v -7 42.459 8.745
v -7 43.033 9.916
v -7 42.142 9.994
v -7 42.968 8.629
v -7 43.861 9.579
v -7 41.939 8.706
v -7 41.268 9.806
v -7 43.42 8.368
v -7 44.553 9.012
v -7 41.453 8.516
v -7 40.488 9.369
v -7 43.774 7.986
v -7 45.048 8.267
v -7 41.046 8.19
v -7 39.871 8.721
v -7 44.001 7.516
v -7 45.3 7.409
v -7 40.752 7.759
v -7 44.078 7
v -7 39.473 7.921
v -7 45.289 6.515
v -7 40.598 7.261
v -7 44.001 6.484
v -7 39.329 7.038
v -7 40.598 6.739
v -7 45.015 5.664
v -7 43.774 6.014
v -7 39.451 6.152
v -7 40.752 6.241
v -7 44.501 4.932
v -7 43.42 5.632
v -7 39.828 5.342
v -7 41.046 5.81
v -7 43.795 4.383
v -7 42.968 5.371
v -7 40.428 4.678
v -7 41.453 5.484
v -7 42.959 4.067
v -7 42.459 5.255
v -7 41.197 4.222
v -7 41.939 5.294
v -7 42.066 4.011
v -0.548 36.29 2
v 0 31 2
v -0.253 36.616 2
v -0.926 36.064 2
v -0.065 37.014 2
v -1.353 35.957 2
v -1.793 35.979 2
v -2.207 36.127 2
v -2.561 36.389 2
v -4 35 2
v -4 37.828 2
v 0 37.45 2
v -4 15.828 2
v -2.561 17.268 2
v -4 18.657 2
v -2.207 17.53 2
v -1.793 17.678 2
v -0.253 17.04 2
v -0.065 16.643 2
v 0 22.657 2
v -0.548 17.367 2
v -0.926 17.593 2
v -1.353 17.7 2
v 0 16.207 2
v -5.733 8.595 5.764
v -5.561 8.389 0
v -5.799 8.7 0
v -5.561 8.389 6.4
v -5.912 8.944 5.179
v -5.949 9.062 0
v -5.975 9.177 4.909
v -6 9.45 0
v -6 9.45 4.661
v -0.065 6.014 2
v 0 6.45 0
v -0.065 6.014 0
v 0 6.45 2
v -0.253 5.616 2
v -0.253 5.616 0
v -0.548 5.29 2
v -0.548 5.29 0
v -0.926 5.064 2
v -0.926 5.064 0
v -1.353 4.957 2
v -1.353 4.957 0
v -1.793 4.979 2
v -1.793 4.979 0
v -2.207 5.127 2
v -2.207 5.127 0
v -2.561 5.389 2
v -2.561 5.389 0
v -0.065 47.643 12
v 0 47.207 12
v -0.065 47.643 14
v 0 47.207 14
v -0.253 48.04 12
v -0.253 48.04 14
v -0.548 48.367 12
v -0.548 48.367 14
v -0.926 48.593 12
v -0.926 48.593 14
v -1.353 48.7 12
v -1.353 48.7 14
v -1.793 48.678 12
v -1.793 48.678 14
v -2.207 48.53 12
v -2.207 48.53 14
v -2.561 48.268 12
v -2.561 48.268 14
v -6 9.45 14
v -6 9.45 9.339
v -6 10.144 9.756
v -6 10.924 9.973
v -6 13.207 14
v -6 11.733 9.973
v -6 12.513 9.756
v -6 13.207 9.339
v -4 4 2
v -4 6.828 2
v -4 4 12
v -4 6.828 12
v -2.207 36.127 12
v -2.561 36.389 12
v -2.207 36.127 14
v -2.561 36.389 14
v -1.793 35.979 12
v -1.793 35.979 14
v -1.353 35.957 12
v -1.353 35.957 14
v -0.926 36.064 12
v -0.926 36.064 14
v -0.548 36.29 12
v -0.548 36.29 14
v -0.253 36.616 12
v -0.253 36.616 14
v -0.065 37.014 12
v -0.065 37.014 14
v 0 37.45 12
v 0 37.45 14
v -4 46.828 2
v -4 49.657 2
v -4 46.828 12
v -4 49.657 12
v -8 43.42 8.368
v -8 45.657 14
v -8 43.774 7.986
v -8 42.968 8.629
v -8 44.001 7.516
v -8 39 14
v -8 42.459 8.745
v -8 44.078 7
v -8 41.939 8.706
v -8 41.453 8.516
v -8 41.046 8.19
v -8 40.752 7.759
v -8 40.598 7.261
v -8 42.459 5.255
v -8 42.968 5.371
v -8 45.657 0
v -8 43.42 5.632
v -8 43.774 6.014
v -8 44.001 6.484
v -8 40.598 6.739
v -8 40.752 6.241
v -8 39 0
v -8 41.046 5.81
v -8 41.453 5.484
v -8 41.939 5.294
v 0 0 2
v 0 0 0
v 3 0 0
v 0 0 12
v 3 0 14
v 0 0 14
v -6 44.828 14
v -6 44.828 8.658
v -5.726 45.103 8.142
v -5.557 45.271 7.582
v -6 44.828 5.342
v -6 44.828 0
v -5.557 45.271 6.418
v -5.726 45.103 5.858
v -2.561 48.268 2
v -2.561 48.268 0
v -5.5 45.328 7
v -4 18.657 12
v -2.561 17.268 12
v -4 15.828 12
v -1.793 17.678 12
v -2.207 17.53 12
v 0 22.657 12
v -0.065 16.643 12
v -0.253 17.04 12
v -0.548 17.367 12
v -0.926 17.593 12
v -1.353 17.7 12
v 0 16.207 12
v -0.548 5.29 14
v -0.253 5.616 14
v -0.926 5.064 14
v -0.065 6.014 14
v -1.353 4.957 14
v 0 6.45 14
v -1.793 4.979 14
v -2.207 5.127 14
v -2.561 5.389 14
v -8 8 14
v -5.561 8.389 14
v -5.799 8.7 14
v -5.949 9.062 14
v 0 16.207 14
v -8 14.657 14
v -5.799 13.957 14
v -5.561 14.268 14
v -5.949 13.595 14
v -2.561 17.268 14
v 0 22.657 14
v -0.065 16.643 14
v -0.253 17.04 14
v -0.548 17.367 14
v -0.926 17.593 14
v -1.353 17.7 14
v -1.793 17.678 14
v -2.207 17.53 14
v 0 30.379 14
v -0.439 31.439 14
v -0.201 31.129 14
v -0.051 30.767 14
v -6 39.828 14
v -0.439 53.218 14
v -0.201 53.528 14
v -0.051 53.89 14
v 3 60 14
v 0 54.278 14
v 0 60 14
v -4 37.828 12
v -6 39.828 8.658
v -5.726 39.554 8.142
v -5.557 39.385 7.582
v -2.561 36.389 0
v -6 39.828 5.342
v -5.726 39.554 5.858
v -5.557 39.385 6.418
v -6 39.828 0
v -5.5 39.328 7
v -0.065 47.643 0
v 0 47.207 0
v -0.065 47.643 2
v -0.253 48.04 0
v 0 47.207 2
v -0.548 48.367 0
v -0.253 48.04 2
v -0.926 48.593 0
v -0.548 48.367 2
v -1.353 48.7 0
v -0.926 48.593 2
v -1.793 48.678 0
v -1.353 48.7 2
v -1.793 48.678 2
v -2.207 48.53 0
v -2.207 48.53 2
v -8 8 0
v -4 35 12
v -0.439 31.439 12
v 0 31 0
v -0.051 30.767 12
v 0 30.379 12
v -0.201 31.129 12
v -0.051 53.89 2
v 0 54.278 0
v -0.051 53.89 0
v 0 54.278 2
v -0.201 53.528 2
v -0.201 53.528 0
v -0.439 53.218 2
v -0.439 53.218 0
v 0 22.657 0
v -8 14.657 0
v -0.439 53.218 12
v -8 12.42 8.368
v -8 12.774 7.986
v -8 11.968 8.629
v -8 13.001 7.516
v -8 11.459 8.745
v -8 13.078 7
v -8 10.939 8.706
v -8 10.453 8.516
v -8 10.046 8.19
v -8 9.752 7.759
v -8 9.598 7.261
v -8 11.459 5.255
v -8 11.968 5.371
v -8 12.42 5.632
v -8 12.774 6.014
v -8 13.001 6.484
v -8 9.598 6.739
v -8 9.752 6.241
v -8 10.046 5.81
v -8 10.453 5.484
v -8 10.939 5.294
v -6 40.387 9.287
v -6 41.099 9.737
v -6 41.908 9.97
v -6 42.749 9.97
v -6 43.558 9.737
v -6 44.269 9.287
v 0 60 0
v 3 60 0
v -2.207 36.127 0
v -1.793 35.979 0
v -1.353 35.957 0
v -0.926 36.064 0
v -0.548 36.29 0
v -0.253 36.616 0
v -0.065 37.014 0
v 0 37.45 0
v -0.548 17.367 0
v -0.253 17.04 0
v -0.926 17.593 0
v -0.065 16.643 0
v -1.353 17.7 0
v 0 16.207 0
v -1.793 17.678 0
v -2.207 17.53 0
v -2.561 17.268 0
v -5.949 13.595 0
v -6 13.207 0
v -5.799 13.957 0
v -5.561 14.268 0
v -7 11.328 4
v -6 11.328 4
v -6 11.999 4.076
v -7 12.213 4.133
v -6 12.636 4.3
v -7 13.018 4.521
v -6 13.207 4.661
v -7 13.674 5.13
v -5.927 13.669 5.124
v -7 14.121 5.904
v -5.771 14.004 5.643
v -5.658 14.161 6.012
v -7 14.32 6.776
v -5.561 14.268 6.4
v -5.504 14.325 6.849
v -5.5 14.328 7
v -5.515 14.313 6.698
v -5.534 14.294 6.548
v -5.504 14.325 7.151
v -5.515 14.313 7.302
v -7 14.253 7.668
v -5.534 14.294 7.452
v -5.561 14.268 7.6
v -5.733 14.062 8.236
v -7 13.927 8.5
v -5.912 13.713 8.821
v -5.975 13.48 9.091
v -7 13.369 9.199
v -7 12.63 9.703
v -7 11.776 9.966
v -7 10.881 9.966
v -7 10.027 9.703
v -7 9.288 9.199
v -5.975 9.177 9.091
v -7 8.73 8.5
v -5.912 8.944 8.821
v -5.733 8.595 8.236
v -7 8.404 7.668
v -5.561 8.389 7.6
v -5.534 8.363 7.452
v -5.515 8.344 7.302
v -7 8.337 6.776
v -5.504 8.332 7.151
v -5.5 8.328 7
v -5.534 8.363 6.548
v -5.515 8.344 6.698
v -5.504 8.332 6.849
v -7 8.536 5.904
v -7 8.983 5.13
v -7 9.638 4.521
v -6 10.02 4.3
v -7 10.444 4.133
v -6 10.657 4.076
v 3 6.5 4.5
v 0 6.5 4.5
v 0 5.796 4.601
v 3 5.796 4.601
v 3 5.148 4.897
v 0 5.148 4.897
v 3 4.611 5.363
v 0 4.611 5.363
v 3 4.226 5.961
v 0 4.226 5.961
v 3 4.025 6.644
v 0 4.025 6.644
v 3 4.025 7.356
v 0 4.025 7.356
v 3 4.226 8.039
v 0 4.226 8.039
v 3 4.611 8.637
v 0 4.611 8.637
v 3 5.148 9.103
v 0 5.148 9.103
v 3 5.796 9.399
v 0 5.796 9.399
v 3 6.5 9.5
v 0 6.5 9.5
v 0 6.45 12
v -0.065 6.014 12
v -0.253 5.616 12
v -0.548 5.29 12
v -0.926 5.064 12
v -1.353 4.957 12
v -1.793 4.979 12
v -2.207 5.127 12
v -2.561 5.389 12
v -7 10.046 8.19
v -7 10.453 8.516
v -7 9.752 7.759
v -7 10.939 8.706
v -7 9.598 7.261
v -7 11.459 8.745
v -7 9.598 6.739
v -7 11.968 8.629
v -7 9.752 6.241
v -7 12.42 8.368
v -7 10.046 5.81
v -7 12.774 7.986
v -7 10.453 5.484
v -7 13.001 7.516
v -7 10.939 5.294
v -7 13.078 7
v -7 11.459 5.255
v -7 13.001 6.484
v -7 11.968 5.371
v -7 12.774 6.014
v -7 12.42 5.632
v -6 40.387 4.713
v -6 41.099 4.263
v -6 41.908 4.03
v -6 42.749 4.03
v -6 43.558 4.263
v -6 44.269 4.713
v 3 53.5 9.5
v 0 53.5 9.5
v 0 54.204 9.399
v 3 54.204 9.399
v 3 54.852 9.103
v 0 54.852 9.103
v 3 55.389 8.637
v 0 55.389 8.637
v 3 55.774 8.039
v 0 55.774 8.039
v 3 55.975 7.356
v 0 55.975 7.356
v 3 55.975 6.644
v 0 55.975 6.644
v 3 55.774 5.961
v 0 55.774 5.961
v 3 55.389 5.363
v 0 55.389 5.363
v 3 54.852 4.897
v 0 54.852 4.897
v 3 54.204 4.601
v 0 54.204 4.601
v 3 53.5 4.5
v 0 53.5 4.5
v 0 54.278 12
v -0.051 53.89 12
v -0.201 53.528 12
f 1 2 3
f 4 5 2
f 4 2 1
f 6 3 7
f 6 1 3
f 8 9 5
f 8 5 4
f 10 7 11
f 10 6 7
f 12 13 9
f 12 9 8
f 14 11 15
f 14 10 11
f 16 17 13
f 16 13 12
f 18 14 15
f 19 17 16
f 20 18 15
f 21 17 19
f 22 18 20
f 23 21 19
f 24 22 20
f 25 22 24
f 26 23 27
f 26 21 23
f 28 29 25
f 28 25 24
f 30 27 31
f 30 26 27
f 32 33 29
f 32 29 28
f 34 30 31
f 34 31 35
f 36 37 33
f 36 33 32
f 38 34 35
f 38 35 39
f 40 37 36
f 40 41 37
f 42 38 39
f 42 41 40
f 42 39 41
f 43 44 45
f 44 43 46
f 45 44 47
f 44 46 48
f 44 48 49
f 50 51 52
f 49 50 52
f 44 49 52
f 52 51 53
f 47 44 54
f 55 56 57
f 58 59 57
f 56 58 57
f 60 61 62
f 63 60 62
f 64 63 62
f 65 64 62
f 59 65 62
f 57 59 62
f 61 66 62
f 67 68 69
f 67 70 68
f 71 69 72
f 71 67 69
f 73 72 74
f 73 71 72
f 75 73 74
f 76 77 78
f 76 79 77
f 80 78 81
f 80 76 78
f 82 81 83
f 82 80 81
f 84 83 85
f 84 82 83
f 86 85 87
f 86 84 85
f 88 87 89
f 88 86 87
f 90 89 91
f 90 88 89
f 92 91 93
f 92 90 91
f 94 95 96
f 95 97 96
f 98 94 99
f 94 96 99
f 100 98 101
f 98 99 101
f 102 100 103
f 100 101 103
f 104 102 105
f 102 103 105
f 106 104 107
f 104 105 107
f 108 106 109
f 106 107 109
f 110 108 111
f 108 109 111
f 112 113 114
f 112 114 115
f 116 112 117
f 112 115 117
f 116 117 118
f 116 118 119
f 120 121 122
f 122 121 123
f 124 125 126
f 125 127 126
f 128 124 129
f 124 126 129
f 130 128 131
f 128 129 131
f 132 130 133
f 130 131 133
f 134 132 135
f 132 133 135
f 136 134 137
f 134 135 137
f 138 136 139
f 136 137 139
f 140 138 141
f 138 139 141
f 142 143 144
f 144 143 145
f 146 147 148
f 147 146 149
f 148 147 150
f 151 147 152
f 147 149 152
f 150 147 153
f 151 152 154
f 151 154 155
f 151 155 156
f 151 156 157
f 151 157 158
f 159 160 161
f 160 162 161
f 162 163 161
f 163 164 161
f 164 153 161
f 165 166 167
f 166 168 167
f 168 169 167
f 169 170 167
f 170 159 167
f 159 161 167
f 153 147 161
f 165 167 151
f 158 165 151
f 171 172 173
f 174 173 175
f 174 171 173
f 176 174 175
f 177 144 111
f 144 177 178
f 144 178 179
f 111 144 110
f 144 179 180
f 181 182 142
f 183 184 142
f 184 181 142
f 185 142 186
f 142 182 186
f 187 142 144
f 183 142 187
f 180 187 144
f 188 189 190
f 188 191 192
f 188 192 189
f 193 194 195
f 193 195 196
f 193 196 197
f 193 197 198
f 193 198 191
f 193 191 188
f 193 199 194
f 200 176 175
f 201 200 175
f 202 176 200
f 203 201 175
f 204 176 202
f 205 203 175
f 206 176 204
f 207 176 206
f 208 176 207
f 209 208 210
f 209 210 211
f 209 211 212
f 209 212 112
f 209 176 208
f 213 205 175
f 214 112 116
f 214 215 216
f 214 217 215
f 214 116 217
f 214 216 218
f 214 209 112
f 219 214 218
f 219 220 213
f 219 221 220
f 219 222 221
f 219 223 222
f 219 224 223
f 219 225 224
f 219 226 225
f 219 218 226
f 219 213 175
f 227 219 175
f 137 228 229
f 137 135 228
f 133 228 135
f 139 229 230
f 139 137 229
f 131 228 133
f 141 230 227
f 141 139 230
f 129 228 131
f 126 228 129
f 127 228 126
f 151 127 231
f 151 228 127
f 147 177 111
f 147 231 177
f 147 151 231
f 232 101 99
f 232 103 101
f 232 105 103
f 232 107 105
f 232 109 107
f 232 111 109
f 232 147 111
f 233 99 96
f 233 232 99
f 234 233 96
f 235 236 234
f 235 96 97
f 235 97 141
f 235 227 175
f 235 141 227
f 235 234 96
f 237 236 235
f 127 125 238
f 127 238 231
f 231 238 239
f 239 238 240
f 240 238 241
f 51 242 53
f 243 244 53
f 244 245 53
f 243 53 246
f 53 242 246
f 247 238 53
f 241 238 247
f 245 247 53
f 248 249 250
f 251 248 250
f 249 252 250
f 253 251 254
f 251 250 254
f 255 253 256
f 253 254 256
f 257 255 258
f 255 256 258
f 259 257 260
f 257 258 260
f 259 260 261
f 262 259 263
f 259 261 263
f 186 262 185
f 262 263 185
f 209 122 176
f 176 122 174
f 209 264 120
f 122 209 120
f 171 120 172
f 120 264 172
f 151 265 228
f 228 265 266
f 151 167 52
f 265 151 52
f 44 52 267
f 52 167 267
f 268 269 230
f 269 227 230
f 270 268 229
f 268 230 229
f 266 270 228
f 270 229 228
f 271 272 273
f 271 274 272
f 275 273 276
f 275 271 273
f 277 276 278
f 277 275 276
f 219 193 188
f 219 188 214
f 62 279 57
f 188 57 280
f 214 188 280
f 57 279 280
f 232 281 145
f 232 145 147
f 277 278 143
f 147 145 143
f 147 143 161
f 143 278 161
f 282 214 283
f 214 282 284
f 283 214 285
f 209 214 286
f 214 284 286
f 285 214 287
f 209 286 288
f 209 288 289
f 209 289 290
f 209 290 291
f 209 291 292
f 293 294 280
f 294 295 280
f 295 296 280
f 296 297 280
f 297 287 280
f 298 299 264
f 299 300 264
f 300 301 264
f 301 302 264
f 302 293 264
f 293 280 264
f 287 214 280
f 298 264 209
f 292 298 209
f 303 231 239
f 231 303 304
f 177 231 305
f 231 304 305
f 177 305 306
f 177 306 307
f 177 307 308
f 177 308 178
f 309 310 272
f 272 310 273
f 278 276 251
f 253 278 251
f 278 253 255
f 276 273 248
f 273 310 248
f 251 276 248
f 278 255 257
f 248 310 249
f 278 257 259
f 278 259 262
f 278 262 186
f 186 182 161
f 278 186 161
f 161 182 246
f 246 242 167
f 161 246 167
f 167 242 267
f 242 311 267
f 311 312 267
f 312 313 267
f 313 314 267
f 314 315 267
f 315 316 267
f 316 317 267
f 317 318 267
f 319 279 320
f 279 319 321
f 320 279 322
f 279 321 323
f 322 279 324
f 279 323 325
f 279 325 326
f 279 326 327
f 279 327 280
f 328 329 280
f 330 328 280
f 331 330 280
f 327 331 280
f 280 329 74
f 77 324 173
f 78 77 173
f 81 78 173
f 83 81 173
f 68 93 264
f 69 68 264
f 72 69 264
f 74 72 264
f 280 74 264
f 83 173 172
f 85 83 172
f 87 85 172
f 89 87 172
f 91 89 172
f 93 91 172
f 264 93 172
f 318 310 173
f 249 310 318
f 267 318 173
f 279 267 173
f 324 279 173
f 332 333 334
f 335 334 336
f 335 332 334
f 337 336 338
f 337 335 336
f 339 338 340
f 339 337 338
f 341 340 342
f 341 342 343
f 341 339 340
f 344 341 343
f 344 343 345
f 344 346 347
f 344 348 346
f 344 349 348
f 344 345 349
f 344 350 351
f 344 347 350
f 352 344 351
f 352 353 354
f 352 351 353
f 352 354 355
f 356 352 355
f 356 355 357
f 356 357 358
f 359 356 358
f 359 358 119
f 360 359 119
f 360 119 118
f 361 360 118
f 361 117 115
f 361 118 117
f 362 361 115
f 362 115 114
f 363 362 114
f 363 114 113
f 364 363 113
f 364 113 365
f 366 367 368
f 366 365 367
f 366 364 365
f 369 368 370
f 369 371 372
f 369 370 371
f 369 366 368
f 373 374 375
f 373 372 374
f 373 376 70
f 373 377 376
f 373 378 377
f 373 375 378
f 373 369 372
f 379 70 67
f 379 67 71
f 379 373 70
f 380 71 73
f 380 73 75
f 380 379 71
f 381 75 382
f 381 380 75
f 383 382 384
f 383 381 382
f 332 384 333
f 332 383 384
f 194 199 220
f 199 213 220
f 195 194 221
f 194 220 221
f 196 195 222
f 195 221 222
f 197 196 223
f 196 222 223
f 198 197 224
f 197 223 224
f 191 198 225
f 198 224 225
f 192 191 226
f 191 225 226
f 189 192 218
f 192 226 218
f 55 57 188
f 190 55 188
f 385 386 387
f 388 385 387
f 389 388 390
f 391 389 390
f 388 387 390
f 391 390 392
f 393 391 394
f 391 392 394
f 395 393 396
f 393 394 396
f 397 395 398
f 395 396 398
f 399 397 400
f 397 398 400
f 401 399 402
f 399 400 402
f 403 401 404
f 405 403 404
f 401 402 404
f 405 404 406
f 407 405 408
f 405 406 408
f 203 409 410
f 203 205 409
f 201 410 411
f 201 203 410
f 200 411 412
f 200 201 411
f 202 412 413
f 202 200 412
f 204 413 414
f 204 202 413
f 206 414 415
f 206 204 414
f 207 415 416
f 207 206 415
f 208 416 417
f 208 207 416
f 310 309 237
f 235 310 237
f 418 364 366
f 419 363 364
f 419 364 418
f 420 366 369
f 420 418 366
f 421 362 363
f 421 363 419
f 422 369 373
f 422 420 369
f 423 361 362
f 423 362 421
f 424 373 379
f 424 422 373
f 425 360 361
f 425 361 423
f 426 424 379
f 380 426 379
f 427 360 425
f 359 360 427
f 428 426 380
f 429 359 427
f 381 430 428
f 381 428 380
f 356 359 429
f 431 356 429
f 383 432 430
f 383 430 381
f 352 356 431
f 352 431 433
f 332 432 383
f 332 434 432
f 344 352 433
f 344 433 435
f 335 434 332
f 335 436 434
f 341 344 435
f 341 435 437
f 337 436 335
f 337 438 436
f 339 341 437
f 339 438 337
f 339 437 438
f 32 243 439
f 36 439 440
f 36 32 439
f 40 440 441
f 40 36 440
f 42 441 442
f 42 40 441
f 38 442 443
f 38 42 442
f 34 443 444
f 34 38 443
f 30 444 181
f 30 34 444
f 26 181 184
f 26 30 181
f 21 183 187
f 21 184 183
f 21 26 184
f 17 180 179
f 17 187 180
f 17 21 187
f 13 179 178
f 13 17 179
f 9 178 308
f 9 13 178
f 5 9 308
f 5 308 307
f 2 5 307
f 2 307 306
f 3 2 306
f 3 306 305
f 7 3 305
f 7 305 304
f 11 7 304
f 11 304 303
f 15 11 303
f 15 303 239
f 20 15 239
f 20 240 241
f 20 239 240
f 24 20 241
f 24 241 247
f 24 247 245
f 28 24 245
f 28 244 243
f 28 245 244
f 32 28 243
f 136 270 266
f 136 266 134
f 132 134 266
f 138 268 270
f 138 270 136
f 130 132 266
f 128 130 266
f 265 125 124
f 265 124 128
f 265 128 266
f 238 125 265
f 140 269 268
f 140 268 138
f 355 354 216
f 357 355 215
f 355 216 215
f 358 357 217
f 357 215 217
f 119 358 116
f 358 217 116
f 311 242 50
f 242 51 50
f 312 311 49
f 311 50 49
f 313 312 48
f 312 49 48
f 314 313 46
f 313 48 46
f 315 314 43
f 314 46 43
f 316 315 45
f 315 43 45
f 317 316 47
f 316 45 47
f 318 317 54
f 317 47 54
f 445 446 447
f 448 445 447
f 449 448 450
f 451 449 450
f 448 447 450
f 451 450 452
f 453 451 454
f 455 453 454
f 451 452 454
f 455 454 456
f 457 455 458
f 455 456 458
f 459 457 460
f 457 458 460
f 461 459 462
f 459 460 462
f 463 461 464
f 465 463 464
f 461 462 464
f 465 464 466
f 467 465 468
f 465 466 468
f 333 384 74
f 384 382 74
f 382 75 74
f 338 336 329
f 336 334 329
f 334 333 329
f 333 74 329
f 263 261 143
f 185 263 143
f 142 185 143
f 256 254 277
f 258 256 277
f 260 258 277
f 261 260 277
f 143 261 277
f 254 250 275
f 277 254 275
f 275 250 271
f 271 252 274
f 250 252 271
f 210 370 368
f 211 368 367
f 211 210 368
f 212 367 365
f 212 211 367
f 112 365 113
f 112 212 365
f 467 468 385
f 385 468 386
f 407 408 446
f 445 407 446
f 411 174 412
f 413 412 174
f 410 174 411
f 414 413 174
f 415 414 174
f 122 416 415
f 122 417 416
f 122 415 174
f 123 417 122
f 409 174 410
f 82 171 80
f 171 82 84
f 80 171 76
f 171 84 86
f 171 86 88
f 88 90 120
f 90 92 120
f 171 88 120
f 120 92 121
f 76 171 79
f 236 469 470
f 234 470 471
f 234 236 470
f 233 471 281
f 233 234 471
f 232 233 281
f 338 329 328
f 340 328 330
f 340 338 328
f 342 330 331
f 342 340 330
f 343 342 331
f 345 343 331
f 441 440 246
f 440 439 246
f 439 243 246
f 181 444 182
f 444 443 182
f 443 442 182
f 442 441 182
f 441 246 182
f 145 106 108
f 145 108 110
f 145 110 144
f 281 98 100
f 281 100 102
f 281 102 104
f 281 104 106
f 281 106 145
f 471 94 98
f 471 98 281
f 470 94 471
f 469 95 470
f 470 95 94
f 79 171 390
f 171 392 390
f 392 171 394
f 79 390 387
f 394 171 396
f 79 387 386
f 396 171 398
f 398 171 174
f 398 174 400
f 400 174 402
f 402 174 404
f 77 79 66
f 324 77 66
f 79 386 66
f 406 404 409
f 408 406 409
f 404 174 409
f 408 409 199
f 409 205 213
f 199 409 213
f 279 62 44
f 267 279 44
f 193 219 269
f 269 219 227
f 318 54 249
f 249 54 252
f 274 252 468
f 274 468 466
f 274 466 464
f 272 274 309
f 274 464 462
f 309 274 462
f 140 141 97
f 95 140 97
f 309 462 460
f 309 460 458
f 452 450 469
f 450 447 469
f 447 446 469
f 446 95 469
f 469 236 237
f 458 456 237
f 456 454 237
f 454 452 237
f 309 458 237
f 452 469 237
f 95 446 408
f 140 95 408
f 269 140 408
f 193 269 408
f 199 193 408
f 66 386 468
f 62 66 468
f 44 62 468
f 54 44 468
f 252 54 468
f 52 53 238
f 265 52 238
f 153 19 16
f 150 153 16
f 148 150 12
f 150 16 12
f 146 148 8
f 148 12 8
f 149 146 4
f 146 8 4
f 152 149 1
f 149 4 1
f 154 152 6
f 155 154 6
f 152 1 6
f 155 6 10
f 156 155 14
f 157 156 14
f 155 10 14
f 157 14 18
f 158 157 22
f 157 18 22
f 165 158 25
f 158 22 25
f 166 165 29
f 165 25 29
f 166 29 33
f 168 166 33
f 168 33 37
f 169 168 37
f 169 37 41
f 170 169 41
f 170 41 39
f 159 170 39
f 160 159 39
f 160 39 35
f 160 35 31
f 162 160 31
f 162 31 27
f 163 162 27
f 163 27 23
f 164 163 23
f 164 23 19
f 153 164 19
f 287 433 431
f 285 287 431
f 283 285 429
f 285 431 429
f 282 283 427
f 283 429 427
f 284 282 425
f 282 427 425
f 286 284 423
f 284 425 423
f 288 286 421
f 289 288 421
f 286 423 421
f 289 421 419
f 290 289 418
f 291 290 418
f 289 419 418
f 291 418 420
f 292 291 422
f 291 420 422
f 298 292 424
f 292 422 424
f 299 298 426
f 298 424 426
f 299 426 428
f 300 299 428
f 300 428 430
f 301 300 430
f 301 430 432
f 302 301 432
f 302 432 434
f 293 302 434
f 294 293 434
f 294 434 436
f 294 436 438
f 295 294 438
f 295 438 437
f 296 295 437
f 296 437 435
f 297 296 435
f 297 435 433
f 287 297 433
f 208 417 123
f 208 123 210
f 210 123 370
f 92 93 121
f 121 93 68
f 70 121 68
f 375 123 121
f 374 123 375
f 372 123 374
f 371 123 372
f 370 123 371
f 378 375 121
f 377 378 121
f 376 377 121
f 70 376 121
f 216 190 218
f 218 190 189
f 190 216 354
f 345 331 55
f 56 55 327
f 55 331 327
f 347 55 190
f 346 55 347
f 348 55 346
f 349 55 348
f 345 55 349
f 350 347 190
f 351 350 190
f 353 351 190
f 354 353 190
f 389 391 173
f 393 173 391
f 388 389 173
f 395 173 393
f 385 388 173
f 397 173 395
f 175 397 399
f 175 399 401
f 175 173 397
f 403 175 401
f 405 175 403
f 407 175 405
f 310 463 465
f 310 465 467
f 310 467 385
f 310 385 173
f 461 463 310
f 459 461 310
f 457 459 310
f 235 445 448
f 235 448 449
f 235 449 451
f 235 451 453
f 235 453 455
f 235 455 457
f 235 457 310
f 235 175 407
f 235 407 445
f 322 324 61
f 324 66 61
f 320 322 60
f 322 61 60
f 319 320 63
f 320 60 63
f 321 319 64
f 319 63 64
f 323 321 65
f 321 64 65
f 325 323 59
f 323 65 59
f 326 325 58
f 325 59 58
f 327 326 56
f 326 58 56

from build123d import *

# Parameters (mm, degrees)
SKETCH4_W           = 60
SKETCH4_H           = 14
BOSS_EXTRUDE2_DEPTH = 3
BOSS_EXTRUDE3_REACH = 63.685
SKETCH7_W           = 4
SKETCH7_H           = 10
CUT_EXTRUDE2_DEPTH  = 63.128898268
SKETCH8_R           = 1.75
CUT_EXTRUDE3_DEPTH  = 63.265560304
CUT_EXTRUDE4_START  = -1
SKETCH9_R           = 3
CUT_EXTRUDE4_DEPTH  = 1.5
FILLET1_R           = 1.5


with BuildPart() as part:
    # Sketch4 → Boss-Extrude2 (new body)
    with BuildSketch(Plane.YZ):
        with Locations((30, 7)):
            Rectangle(SKETCH4_W, SKETCH4_H)
        with BuildLine():
            Line((6.5, 9.5), (53.5, 9.5))
            ThreePointArc((53.5, 9.5), (56, 7), (53.5, 4.5))
            Line((53.5, 4.5), (6.5, 4.5))
            ThreePointArc((6.5, 4.5), (4, 7), (6.5, 9.5))
        make_face(mode=Mode.SUBTRACT)
    extrude(amount=BOSS_EXTRUDE2_DEPTH)

    # Boss-Extrude3: up to this face of the body (flat: up to its plane)
    boss_extrude3_end = Plane(part.part.faces().sort_by_distance((1.5, 30, 14))[0])
    # Sketch6 → Boss-Extrude3 (add, up to the picked face)
    with BuildSketch(Plane(origin=(0, 0, 0), x_dir=(1, 0, 0), z_dir=(0, 0, -1)), mode=Mode.PRIVATE) as boss_extrude3_sk1:
        Polygon((0, -2.828427125), (-6, -8.828427125), (-6, -13.828427125), (0, -19.828427125), (0, -22.656854249), (-8, -14.656854249), (-8, -8), (0, 0), align=None)
    boss_extrude3_tool1 = split(extrude(boss_extrude3_sk1.sketch, amount=-BOSS_EXTRUDE3_REACH, mode=Mode.PRIVATE), bisect_by=boss_extrude3_end, keep=Keep.BOTH, mode=Mode.PRIVATE)
    # Sketch6 → Boss-Extrude3 (add, up to the picked face)
    with BuildSketch(Plane(origin=(0, 0, 0), x_dir=(1, 0, 0), z_dir=(0, 0, -1)), mode=Mode.PRIVATE) as boss_extrude3_sk2:
        Polygon((0, -33.828427125), (-6, -39.828427125), (-6, -44.828427125), (0, -50.828427125), (0, -53.656854249), (-8, -45.656854249), (-8, -39), (0, -31), align=None)
    boss_extrude3_tool2 = split(extrude(boss_extrude3_sk2.sketch, amount=-BOSS_EXTRUDE3_REACH, mode=Mode.PRIVATE), bisect_by=boss_extrude3_end, keep=Keep.BOTH, mode=Mode.PRIVATE)
    add(boss_extrude3_tool1.solids().sort_by(Axis((-3.169902, 5.658525, 0), (0, 0, 1)))[0])
    add(boss_extrude3_tool2.solids().sort_by(Axis((-3.169902, 36.658525, 0), (0, 0, 1)))[0])

    # Sketch7 → Cut-Extrude2 (cut, through all)
    with BuildSketch(Plane(origin=(0, 60, 0), x_dir=(-1, 0, 0), z_dir=(0, 1, 0))):
        with Locations((2, 7)):
            Rectangle(SKETCH7_W, SKETCH7_H)
    extrude(amount=-CUT_EXTRUDE2_DEPTH, mode=Mode.SUBTRACT)

    # Sketch8 → Cut-Extrude3 (cut, through all)
    with BuildSketch(Plane.YZ.offset(-6)):
        with Locations((42.328427125, 7)):
            Circle(SKETCH8_R)
        with Locations((11.328427125, 7)):
            Circle(SKETCH8_R)
    extrude(amount=-CUT_EXTRUDE3_DEPTH, mode=Mode.SUBTRACT)

    # Sketch9 → Cut-Extrude4 (cut)
    with BuildSketch(Plane.YZ.offset(-6).offset(CUT_EXTRUDE4_START)):
        with Locations(Location((11.328427125, 7, 0), (0, 0, 270))):
            Circle(SKETCH9_R)
        with Locations(Location((42.328427125, 7, 0), (0, 0, 213.557309762))):
            Circle(SKETCH9_R)
    extrude(amount=CUT_EXTRUDE4_DEPTH, mode=Mode.SUBTRACT)

    # Fillet1
    fillet1_edges = [part.edges().sort_by_distance(p)[0] for p in [
        (0, 53.656854249, 1),
        (0, 53.656854249, 13),
        (0, 33.828427125, 13),
        (0, 50.828427125, 13),
        (0, 31, 13),
        (0, 50.828427125, 1),
        (0, 33.828427125, 1),
        (0, 2.828427125, 13),
        (0, 19.828427125, 13),
        (0, 19.828427125, 1),
        (0, 2.828427125, 1),
        (-6, 13.828427125, 11.329156198),
        (-6, 8.828427125, 11.329156198),
        (-6, 8.828427125, 2.670843802),
        (-6, 13.828427125, 2.670843802),
    ]]
    fillet(fillet1_edges, radius=FILLET1_R)


solid = part.part
